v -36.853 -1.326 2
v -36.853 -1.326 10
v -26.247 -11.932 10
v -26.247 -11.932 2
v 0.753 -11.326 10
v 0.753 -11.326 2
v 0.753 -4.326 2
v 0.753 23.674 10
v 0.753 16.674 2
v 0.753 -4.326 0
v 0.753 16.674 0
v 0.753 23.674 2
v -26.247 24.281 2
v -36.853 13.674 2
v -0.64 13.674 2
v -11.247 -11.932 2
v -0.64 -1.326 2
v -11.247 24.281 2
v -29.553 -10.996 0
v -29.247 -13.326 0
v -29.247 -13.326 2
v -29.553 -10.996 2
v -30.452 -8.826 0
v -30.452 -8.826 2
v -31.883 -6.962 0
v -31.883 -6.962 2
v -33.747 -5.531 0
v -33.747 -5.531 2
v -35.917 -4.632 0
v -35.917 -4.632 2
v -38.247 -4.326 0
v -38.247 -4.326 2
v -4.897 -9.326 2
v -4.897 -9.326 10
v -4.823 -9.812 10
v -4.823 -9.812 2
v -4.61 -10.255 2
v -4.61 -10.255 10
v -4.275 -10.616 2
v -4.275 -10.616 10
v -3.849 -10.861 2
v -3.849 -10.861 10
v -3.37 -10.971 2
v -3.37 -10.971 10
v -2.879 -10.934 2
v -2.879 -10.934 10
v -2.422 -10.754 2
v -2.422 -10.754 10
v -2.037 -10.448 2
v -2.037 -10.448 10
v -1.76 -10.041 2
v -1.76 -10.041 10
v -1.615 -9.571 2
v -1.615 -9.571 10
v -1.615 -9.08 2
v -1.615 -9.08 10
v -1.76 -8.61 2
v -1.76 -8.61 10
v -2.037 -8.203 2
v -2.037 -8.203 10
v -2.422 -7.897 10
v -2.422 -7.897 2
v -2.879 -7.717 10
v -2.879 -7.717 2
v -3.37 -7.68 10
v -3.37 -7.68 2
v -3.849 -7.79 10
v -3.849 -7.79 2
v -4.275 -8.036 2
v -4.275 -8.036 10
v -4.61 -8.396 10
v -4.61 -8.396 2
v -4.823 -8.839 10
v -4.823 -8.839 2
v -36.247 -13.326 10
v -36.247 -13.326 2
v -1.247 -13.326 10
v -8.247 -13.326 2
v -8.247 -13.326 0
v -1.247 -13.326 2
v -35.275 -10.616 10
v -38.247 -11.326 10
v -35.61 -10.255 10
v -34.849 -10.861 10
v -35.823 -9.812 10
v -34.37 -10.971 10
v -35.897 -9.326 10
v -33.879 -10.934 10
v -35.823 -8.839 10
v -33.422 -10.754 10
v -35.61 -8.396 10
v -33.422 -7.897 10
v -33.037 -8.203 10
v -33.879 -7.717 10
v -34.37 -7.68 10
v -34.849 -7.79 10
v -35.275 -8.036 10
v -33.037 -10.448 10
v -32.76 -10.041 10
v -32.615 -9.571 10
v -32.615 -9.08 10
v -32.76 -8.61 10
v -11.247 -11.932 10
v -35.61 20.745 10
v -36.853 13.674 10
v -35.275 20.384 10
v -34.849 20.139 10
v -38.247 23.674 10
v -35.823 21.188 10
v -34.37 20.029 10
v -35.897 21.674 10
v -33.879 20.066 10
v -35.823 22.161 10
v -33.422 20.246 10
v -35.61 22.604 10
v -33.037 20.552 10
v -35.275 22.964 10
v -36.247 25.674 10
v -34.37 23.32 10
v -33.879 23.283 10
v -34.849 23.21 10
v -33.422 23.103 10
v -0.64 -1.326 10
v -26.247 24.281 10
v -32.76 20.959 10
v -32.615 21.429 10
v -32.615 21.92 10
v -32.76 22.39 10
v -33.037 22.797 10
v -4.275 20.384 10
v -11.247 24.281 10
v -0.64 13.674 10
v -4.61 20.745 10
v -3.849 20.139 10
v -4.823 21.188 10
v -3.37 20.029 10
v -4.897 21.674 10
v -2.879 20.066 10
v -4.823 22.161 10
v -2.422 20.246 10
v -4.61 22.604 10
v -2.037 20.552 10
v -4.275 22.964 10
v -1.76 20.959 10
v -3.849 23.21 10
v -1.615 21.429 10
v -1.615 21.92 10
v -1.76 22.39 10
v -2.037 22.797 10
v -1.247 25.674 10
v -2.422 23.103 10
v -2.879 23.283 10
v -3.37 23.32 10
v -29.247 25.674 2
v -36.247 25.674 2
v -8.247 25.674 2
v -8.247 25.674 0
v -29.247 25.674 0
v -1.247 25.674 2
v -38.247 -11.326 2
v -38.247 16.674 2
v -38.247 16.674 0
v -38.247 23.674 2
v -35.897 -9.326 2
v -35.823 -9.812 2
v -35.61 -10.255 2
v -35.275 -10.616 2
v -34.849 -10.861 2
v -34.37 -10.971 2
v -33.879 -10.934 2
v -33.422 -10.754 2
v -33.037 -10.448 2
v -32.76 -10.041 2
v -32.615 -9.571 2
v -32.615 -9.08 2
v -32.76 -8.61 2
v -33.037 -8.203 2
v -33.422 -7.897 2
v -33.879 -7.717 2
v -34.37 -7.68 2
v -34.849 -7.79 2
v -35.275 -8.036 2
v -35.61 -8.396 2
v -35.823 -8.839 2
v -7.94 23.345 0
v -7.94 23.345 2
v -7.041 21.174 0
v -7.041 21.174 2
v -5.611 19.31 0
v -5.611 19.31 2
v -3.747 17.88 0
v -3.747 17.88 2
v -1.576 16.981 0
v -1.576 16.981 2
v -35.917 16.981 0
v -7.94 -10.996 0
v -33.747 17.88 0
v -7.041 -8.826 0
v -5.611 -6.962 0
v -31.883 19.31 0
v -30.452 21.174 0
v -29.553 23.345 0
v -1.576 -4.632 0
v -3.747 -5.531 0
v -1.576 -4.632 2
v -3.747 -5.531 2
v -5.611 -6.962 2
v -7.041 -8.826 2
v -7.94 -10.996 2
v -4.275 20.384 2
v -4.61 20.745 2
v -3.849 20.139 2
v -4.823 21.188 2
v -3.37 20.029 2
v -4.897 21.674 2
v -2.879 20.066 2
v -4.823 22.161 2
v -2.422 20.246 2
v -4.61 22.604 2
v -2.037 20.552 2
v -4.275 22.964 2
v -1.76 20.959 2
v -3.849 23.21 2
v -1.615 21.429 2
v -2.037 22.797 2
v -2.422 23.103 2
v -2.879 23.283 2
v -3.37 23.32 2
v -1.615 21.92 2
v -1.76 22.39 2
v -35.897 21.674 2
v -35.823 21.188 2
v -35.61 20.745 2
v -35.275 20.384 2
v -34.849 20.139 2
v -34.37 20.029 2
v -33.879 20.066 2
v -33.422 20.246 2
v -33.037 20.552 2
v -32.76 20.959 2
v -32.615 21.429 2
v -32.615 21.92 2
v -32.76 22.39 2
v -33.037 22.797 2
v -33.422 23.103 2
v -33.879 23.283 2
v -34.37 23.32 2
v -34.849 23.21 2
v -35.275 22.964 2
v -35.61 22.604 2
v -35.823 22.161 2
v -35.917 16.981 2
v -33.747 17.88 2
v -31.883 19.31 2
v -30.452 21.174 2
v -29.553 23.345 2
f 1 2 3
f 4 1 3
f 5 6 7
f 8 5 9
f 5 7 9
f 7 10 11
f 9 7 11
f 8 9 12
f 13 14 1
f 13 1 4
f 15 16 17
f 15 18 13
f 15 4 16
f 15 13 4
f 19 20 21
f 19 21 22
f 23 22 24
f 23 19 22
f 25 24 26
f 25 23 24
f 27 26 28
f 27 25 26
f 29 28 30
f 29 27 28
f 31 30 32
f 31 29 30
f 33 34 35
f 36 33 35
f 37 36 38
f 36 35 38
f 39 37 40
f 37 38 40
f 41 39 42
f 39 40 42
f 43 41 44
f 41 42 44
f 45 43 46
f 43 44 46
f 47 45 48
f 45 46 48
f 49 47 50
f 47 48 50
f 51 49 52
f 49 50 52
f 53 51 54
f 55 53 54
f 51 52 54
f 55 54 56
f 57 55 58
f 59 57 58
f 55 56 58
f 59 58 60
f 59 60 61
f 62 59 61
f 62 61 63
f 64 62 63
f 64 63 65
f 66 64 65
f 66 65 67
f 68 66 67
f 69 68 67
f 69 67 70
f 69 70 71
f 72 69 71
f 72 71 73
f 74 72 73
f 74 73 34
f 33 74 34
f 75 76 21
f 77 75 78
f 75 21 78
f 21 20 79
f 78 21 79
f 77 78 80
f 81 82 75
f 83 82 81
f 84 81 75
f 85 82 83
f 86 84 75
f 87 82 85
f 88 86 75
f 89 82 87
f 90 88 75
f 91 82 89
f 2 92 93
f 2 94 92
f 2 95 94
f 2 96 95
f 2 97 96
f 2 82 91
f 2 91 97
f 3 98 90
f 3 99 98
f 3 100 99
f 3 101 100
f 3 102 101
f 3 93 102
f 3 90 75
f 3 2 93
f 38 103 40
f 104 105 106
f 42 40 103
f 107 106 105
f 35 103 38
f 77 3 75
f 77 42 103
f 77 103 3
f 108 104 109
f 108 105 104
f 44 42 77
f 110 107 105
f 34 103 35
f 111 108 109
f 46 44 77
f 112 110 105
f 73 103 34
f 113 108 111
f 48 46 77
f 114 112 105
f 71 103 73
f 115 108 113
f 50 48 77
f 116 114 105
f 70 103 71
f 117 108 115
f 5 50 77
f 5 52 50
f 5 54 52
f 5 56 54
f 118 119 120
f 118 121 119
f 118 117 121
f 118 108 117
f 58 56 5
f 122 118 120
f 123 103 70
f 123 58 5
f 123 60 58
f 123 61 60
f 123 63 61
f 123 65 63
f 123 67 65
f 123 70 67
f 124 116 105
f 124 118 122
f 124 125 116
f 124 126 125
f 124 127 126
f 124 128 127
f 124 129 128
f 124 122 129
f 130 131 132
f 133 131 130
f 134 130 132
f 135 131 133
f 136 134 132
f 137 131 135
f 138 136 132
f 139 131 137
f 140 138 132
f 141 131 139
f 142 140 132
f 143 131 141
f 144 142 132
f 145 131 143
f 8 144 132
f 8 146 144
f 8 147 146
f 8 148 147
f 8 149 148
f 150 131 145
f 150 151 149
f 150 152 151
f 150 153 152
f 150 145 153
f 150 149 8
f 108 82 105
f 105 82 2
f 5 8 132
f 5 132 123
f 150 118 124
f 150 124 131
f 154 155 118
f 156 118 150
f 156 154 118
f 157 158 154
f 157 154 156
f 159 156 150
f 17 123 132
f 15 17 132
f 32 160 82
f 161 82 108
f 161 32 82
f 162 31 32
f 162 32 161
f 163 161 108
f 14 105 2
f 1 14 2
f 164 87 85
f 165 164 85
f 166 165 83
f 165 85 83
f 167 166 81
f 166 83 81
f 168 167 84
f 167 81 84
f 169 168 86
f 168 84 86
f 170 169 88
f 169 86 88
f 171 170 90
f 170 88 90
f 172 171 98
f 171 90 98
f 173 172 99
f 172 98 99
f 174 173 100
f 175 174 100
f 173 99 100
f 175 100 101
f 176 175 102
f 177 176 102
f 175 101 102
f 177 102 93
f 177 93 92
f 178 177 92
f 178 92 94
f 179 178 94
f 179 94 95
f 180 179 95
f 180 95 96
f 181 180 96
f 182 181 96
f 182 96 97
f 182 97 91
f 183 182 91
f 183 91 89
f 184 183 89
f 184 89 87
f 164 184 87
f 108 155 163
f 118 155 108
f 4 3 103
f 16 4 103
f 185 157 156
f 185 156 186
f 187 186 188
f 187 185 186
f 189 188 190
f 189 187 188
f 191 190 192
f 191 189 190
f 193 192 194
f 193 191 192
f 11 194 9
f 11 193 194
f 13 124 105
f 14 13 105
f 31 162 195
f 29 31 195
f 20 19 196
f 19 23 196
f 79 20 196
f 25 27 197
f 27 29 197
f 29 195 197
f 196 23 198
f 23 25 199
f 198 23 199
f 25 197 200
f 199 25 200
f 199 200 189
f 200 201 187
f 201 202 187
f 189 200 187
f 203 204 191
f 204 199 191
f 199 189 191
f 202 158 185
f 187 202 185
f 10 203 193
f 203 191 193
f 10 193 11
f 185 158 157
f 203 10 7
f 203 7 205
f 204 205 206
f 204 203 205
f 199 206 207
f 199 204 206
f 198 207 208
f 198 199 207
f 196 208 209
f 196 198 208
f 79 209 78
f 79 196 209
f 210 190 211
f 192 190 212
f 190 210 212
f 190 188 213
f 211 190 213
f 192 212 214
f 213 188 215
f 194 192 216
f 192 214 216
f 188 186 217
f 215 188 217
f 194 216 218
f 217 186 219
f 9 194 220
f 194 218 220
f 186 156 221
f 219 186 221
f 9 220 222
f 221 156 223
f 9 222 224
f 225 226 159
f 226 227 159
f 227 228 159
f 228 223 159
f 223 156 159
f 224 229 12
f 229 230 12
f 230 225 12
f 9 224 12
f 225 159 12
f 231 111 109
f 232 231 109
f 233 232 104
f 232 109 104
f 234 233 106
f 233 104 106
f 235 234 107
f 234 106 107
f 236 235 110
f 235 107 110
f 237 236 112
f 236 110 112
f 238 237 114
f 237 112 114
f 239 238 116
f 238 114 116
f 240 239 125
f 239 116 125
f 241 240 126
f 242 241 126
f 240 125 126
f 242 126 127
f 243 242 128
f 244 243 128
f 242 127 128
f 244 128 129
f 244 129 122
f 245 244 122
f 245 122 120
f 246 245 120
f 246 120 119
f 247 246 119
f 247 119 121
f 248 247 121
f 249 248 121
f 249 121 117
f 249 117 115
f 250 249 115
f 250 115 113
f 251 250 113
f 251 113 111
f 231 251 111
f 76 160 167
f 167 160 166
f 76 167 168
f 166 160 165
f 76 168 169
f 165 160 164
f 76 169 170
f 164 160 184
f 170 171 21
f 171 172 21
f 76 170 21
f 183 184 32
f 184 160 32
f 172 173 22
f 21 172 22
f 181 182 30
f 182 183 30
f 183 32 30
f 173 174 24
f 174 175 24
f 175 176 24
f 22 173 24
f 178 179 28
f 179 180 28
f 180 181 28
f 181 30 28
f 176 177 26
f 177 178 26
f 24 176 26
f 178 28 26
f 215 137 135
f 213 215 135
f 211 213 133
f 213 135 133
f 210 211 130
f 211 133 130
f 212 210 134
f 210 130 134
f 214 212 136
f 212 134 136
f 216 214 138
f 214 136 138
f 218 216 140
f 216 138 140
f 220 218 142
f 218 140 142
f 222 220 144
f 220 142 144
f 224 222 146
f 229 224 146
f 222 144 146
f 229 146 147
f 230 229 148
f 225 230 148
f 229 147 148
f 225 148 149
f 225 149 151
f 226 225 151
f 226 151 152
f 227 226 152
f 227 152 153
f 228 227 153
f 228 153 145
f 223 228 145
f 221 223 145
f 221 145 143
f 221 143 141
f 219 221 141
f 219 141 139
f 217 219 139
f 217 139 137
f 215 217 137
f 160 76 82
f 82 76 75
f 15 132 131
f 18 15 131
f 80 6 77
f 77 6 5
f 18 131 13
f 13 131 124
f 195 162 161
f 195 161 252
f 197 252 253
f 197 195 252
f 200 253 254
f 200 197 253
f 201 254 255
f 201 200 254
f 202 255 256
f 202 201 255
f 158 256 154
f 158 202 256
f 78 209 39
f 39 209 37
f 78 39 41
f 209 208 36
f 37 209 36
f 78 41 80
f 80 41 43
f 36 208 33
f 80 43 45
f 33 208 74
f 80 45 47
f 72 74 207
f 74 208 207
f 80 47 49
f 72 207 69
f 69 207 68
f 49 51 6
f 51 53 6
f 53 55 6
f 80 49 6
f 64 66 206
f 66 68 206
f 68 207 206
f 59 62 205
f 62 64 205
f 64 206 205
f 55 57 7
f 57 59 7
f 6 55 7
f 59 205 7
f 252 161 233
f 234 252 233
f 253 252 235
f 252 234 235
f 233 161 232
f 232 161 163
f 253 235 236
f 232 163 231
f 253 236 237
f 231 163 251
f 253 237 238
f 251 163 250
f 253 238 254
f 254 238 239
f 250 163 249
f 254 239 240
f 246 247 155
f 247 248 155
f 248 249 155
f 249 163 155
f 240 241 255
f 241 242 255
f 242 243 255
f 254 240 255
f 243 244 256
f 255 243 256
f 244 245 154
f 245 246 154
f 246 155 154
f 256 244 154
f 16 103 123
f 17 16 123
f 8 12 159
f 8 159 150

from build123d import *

# Parameters (mm, degrees)
F0_W     = 39
F0_H     = 39
F1_DEPTH = 10
F3_DEPTH = 2
F4_D     = 3.3
F4_DEPTH = 20
F4_TIP   = 0.9914200214
F5_SIZE  = 2
F8_DEPTH = 8


with BuildPart() as f1:
    # F0 (on Top) → F1 (new body)
    with BuildSketch(Plane.XY):
        with Locations((-18.7466505767, 6.1744563282)):
            Rectangle(F0_W, F0_H)
    extrude(amount=F1_DEPTH)

    # F2 (on face) → F3 (cut)
    with BuildSketch(Plane.XY):
        with BuildLine():
            ThreePointArc((-8.2466505767, 25.6744563282), (-5.6106116074, 19.3104952975), (0.7533494233, 16.6744563282))
            Line((0.7533494233, 16.6744563282), (0.7533494233, 25.6744563282))
            Line((0.7533494233, 25.6744563282), (-8.2466505767, 25.6744563282))
        make_face()
        with BuildLine():
            ThreePointArc((-38.2466505767, 16.6744563282), (-31.882689546, 19.3104952975), (-29.2466505767, 25.6744563282))
            Line((-29.2466505767, 25.6744563282), (-38.2466505767, 25.6744563282))
            Line((-38.2466505767, 25.6744563282), (-38.2466505767, 16.6744563282))
        make_face()
        with BuildLine():
            Line((-38.2466505767, -13.3255436718), (-29.2466505767, -13.3255436718))
            ThreePointArc((-29.2466505767, -13.3255436718), (-31.882689546, -6.9615826412), (-38.2466505767, -4.3255436718))
            Line((-38.2466505767, -4.3255436718), (-38.2466505767, -13.3255436718))
        make_face()
        with BuildLine():
            Line((-8.2466505767, -13.3255436718), (0.7533494233, -13.3255436718))
            Line((0.7533494233, -13.3255436718), (0.7533494233, -4.3255436718))
            ThreePointArc((0.7533494233, -4.3255436718), (-5.6106116074, -6.9615826412), (-8.2466505767, -13.3255436718))
        make_face()
    extrude(amount=F3_DEPTH, mode=Mode.SUBTRACT)

    # F4
    with Locations(Plane(origin=(0, 0, 0), x_dir=(1, 0, 0), z_dir=(0, 0, -1))):
        with Locations((-3.2466505767, -21.6744563282), (-34.2466505767, -21.6744563282), (-34.2466505767, 9.3255436718), (-3.2466505767, 9.3255436718)):
            Hole(F4_D / 2, depth=F4_DEPTH)
            with Locations((0, 0, -(F4_DEPTH + F4_TIP / 2))):  # 118° drill point
                Cone(0, F4_D / 2, F4_TIP, mode=Mode.SUBTRACT)

    # F5
    f5_edges = [f1.edges().sort_by_distance(p)[0] for p in [
        (0.753349, -13.325544, 6),
        (0.753349, 25.674456, 6),
        (-38.246651, 25.674456, 6),
        (-38.246651, -13.325544, 6),
    ]]
    chamfer(f5_edges, length=F5_SIZE)

    # F7 (on face) → F8 (cut)
    with BuildSketch(Plane.XY.offset(10)):
        Polygon((-11.2466505767, -11.9321453896), (-0.6400488589, -1.3255436718), (-0.6400488589, 13.6744563282), (-11.2466505767, 24.281058046), (-26.2466505767, 24.281058046), (-36.8532522945, 13.6744563282), (-36.8532522945, -1.3255436718), (-26.2466505767, -11.9321453896), align=None)
    extrude(amount=-F8_DEPTH, mode=Mode.SUBTRACT)


solid = f1.part
